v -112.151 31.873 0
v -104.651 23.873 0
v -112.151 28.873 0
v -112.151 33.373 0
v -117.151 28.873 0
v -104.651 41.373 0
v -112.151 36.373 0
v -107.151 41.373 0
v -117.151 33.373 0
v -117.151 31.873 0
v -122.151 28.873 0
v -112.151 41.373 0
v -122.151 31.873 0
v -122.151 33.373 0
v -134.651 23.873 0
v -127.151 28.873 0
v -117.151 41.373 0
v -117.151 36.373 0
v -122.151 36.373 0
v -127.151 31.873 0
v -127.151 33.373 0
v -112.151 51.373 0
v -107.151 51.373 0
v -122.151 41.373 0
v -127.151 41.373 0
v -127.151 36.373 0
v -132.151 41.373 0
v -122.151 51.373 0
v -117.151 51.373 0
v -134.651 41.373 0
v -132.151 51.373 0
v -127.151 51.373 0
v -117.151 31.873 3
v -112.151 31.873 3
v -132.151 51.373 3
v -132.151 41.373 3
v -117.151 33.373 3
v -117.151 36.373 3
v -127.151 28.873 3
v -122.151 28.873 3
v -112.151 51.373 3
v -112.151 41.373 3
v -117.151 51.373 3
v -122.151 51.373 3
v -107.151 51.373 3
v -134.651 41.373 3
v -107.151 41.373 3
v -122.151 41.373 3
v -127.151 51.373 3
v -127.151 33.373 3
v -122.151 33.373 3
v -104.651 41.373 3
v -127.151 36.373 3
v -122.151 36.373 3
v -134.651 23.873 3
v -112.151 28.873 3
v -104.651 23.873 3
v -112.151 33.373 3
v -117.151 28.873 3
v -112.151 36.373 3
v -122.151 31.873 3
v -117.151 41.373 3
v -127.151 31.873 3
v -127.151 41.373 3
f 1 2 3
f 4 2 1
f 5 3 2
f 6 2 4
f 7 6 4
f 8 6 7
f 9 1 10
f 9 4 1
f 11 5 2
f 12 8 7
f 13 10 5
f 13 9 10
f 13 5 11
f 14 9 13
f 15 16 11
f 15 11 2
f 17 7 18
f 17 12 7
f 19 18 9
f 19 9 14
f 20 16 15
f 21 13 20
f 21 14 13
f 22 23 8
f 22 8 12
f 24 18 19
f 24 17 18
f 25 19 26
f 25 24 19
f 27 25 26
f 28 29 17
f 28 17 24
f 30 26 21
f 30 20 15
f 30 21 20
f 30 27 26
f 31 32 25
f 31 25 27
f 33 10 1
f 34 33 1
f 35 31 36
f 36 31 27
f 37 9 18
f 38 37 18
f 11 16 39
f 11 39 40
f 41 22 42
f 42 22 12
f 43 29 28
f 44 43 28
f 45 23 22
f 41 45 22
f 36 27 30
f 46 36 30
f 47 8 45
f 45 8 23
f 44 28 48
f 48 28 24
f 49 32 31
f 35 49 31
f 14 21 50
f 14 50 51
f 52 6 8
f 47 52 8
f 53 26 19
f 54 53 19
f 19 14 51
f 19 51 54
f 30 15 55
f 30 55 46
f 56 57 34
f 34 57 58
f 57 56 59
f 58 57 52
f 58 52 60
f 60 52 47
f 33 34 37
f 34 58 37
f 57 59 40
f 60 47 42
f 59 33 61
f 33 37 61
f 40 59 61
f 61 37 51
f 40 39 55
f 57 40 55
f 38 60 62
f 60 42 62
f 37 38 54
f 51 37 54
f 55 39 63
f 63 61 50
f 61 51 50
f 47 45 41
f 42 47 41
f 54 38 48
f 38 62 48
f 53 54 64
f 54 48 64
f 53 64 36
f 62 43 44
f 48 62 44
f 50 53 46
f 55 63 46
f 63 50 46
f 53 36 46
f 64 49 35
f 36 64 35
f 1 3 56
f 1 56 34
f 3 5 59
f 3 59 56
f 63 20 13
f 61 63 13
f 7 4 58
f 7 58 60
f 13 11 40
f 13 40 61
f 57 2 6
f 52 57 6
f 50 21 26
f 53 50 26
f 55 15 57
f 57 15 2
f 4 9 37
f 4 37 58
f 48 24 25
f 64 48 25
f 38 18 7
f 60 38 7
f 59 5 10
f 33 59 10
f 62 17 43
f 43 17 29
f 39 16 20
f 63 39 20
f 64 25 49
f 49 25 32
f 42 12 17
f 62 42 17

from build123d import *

# Parameters (mm, degrees)
ESQUISSE1_W        = 5
ESQUISSE1_H        = 3
BOSS_EXTRU_1_DEPTH = 3
ESQUISSE2_W        = 2.5
ESQUISSE2_H        = 7.5
BOSS_EXTRU_2_DEPTH = 3


with BuildPart() as part:
    # Esquisse1 → Boss.-Extru.1 (new body)
    with BuildSketch(Plane.XY):
        Polygon((-117.151475887, 41.372526747), (-117.151475887, 51.372526747), (-122.151475887, 51.372526747), (-122.151475887, 41.372526747), (-127.151475887, 41.372526747), (-127.151475887, 51.372526747), (-132.151475887, 51.372526747), (-132.151475887, 41.372526747), (-134.651475887, 41.372526747), (-134.651475887, 36.372526747), (-132.151475887, 36.372526747), (-132.151475887, 33.372526747), (-134.651475887, 33.372526747), (-134.651475887, 31.872526747), (-132.151475887, 31.872526747), (-132.151475887, 28.872526747), (-134.651475887, 28.872526747), (-134.651475887, 23.872526747), (-104.651475887, 23.872526747), (-104.651475887, 28.872526747), (-107.151475887, 28.872526747), (-107.151475887, 31.872526747), (-104.651475887, 31.872526747), (-104.651475887, 33.372526747), (-107.151475887, 33.372526747), (-107.151475887, 36.372526747), (-104.651475887, 36.372526747), (-104.651475887, 41.372526747), (-107.151475887, 41.372526747), (-107.151475887, 51.372526747), (-112.151475887, 51.372526747), (-112.151475887, 41.372526747), align=None)
        with Locations((-114.651475887, 30.372526747)):
            Rectangle(ESQUISSE1_W, ESQUISSE1_H, mode=Mode.SUBTRACT)
        with Locations((-124.651475887, 30.372526747)):
            Rectangle(ESQUISSE1_W, ESQUISSE1_H, mode=Mode.SUBTRACT)
        with Locations((-114.651475887, 34.872526747)):
            Rectangle(ESQUISSE1_W, ESQUISSE1_H, mode=Mode.SUBTRACT)
        with Locations((-124.651475887, 34.872526747)):
            Rectangle(ESQUISSE1_W, ESQUISSE1_H, mode=Mode.SUBTRACT)
    extrude(amount=BOSS_EXTRU_1_DEPTH)

    # Esquisse2 → Boss.-Extru.2 (add)
    with BuildSketch(Plane(origin=(0, 0, 0), x_dir=(-1, 0, 0), z_dir=(0, 0, -1))):
        with Locations((133.401475887, 32.622526747)):
            Rectangle(ESQUISSE2_W, ESQUISSE2_H)
        with Locations((105.901475887, 32.622526747)):
            Rectangle(ESQUISSE2_W, ESQUISSE2_H)
    extrude(amount=-BOSS_EXTRU_2_DEPTH)


solid = part.part
